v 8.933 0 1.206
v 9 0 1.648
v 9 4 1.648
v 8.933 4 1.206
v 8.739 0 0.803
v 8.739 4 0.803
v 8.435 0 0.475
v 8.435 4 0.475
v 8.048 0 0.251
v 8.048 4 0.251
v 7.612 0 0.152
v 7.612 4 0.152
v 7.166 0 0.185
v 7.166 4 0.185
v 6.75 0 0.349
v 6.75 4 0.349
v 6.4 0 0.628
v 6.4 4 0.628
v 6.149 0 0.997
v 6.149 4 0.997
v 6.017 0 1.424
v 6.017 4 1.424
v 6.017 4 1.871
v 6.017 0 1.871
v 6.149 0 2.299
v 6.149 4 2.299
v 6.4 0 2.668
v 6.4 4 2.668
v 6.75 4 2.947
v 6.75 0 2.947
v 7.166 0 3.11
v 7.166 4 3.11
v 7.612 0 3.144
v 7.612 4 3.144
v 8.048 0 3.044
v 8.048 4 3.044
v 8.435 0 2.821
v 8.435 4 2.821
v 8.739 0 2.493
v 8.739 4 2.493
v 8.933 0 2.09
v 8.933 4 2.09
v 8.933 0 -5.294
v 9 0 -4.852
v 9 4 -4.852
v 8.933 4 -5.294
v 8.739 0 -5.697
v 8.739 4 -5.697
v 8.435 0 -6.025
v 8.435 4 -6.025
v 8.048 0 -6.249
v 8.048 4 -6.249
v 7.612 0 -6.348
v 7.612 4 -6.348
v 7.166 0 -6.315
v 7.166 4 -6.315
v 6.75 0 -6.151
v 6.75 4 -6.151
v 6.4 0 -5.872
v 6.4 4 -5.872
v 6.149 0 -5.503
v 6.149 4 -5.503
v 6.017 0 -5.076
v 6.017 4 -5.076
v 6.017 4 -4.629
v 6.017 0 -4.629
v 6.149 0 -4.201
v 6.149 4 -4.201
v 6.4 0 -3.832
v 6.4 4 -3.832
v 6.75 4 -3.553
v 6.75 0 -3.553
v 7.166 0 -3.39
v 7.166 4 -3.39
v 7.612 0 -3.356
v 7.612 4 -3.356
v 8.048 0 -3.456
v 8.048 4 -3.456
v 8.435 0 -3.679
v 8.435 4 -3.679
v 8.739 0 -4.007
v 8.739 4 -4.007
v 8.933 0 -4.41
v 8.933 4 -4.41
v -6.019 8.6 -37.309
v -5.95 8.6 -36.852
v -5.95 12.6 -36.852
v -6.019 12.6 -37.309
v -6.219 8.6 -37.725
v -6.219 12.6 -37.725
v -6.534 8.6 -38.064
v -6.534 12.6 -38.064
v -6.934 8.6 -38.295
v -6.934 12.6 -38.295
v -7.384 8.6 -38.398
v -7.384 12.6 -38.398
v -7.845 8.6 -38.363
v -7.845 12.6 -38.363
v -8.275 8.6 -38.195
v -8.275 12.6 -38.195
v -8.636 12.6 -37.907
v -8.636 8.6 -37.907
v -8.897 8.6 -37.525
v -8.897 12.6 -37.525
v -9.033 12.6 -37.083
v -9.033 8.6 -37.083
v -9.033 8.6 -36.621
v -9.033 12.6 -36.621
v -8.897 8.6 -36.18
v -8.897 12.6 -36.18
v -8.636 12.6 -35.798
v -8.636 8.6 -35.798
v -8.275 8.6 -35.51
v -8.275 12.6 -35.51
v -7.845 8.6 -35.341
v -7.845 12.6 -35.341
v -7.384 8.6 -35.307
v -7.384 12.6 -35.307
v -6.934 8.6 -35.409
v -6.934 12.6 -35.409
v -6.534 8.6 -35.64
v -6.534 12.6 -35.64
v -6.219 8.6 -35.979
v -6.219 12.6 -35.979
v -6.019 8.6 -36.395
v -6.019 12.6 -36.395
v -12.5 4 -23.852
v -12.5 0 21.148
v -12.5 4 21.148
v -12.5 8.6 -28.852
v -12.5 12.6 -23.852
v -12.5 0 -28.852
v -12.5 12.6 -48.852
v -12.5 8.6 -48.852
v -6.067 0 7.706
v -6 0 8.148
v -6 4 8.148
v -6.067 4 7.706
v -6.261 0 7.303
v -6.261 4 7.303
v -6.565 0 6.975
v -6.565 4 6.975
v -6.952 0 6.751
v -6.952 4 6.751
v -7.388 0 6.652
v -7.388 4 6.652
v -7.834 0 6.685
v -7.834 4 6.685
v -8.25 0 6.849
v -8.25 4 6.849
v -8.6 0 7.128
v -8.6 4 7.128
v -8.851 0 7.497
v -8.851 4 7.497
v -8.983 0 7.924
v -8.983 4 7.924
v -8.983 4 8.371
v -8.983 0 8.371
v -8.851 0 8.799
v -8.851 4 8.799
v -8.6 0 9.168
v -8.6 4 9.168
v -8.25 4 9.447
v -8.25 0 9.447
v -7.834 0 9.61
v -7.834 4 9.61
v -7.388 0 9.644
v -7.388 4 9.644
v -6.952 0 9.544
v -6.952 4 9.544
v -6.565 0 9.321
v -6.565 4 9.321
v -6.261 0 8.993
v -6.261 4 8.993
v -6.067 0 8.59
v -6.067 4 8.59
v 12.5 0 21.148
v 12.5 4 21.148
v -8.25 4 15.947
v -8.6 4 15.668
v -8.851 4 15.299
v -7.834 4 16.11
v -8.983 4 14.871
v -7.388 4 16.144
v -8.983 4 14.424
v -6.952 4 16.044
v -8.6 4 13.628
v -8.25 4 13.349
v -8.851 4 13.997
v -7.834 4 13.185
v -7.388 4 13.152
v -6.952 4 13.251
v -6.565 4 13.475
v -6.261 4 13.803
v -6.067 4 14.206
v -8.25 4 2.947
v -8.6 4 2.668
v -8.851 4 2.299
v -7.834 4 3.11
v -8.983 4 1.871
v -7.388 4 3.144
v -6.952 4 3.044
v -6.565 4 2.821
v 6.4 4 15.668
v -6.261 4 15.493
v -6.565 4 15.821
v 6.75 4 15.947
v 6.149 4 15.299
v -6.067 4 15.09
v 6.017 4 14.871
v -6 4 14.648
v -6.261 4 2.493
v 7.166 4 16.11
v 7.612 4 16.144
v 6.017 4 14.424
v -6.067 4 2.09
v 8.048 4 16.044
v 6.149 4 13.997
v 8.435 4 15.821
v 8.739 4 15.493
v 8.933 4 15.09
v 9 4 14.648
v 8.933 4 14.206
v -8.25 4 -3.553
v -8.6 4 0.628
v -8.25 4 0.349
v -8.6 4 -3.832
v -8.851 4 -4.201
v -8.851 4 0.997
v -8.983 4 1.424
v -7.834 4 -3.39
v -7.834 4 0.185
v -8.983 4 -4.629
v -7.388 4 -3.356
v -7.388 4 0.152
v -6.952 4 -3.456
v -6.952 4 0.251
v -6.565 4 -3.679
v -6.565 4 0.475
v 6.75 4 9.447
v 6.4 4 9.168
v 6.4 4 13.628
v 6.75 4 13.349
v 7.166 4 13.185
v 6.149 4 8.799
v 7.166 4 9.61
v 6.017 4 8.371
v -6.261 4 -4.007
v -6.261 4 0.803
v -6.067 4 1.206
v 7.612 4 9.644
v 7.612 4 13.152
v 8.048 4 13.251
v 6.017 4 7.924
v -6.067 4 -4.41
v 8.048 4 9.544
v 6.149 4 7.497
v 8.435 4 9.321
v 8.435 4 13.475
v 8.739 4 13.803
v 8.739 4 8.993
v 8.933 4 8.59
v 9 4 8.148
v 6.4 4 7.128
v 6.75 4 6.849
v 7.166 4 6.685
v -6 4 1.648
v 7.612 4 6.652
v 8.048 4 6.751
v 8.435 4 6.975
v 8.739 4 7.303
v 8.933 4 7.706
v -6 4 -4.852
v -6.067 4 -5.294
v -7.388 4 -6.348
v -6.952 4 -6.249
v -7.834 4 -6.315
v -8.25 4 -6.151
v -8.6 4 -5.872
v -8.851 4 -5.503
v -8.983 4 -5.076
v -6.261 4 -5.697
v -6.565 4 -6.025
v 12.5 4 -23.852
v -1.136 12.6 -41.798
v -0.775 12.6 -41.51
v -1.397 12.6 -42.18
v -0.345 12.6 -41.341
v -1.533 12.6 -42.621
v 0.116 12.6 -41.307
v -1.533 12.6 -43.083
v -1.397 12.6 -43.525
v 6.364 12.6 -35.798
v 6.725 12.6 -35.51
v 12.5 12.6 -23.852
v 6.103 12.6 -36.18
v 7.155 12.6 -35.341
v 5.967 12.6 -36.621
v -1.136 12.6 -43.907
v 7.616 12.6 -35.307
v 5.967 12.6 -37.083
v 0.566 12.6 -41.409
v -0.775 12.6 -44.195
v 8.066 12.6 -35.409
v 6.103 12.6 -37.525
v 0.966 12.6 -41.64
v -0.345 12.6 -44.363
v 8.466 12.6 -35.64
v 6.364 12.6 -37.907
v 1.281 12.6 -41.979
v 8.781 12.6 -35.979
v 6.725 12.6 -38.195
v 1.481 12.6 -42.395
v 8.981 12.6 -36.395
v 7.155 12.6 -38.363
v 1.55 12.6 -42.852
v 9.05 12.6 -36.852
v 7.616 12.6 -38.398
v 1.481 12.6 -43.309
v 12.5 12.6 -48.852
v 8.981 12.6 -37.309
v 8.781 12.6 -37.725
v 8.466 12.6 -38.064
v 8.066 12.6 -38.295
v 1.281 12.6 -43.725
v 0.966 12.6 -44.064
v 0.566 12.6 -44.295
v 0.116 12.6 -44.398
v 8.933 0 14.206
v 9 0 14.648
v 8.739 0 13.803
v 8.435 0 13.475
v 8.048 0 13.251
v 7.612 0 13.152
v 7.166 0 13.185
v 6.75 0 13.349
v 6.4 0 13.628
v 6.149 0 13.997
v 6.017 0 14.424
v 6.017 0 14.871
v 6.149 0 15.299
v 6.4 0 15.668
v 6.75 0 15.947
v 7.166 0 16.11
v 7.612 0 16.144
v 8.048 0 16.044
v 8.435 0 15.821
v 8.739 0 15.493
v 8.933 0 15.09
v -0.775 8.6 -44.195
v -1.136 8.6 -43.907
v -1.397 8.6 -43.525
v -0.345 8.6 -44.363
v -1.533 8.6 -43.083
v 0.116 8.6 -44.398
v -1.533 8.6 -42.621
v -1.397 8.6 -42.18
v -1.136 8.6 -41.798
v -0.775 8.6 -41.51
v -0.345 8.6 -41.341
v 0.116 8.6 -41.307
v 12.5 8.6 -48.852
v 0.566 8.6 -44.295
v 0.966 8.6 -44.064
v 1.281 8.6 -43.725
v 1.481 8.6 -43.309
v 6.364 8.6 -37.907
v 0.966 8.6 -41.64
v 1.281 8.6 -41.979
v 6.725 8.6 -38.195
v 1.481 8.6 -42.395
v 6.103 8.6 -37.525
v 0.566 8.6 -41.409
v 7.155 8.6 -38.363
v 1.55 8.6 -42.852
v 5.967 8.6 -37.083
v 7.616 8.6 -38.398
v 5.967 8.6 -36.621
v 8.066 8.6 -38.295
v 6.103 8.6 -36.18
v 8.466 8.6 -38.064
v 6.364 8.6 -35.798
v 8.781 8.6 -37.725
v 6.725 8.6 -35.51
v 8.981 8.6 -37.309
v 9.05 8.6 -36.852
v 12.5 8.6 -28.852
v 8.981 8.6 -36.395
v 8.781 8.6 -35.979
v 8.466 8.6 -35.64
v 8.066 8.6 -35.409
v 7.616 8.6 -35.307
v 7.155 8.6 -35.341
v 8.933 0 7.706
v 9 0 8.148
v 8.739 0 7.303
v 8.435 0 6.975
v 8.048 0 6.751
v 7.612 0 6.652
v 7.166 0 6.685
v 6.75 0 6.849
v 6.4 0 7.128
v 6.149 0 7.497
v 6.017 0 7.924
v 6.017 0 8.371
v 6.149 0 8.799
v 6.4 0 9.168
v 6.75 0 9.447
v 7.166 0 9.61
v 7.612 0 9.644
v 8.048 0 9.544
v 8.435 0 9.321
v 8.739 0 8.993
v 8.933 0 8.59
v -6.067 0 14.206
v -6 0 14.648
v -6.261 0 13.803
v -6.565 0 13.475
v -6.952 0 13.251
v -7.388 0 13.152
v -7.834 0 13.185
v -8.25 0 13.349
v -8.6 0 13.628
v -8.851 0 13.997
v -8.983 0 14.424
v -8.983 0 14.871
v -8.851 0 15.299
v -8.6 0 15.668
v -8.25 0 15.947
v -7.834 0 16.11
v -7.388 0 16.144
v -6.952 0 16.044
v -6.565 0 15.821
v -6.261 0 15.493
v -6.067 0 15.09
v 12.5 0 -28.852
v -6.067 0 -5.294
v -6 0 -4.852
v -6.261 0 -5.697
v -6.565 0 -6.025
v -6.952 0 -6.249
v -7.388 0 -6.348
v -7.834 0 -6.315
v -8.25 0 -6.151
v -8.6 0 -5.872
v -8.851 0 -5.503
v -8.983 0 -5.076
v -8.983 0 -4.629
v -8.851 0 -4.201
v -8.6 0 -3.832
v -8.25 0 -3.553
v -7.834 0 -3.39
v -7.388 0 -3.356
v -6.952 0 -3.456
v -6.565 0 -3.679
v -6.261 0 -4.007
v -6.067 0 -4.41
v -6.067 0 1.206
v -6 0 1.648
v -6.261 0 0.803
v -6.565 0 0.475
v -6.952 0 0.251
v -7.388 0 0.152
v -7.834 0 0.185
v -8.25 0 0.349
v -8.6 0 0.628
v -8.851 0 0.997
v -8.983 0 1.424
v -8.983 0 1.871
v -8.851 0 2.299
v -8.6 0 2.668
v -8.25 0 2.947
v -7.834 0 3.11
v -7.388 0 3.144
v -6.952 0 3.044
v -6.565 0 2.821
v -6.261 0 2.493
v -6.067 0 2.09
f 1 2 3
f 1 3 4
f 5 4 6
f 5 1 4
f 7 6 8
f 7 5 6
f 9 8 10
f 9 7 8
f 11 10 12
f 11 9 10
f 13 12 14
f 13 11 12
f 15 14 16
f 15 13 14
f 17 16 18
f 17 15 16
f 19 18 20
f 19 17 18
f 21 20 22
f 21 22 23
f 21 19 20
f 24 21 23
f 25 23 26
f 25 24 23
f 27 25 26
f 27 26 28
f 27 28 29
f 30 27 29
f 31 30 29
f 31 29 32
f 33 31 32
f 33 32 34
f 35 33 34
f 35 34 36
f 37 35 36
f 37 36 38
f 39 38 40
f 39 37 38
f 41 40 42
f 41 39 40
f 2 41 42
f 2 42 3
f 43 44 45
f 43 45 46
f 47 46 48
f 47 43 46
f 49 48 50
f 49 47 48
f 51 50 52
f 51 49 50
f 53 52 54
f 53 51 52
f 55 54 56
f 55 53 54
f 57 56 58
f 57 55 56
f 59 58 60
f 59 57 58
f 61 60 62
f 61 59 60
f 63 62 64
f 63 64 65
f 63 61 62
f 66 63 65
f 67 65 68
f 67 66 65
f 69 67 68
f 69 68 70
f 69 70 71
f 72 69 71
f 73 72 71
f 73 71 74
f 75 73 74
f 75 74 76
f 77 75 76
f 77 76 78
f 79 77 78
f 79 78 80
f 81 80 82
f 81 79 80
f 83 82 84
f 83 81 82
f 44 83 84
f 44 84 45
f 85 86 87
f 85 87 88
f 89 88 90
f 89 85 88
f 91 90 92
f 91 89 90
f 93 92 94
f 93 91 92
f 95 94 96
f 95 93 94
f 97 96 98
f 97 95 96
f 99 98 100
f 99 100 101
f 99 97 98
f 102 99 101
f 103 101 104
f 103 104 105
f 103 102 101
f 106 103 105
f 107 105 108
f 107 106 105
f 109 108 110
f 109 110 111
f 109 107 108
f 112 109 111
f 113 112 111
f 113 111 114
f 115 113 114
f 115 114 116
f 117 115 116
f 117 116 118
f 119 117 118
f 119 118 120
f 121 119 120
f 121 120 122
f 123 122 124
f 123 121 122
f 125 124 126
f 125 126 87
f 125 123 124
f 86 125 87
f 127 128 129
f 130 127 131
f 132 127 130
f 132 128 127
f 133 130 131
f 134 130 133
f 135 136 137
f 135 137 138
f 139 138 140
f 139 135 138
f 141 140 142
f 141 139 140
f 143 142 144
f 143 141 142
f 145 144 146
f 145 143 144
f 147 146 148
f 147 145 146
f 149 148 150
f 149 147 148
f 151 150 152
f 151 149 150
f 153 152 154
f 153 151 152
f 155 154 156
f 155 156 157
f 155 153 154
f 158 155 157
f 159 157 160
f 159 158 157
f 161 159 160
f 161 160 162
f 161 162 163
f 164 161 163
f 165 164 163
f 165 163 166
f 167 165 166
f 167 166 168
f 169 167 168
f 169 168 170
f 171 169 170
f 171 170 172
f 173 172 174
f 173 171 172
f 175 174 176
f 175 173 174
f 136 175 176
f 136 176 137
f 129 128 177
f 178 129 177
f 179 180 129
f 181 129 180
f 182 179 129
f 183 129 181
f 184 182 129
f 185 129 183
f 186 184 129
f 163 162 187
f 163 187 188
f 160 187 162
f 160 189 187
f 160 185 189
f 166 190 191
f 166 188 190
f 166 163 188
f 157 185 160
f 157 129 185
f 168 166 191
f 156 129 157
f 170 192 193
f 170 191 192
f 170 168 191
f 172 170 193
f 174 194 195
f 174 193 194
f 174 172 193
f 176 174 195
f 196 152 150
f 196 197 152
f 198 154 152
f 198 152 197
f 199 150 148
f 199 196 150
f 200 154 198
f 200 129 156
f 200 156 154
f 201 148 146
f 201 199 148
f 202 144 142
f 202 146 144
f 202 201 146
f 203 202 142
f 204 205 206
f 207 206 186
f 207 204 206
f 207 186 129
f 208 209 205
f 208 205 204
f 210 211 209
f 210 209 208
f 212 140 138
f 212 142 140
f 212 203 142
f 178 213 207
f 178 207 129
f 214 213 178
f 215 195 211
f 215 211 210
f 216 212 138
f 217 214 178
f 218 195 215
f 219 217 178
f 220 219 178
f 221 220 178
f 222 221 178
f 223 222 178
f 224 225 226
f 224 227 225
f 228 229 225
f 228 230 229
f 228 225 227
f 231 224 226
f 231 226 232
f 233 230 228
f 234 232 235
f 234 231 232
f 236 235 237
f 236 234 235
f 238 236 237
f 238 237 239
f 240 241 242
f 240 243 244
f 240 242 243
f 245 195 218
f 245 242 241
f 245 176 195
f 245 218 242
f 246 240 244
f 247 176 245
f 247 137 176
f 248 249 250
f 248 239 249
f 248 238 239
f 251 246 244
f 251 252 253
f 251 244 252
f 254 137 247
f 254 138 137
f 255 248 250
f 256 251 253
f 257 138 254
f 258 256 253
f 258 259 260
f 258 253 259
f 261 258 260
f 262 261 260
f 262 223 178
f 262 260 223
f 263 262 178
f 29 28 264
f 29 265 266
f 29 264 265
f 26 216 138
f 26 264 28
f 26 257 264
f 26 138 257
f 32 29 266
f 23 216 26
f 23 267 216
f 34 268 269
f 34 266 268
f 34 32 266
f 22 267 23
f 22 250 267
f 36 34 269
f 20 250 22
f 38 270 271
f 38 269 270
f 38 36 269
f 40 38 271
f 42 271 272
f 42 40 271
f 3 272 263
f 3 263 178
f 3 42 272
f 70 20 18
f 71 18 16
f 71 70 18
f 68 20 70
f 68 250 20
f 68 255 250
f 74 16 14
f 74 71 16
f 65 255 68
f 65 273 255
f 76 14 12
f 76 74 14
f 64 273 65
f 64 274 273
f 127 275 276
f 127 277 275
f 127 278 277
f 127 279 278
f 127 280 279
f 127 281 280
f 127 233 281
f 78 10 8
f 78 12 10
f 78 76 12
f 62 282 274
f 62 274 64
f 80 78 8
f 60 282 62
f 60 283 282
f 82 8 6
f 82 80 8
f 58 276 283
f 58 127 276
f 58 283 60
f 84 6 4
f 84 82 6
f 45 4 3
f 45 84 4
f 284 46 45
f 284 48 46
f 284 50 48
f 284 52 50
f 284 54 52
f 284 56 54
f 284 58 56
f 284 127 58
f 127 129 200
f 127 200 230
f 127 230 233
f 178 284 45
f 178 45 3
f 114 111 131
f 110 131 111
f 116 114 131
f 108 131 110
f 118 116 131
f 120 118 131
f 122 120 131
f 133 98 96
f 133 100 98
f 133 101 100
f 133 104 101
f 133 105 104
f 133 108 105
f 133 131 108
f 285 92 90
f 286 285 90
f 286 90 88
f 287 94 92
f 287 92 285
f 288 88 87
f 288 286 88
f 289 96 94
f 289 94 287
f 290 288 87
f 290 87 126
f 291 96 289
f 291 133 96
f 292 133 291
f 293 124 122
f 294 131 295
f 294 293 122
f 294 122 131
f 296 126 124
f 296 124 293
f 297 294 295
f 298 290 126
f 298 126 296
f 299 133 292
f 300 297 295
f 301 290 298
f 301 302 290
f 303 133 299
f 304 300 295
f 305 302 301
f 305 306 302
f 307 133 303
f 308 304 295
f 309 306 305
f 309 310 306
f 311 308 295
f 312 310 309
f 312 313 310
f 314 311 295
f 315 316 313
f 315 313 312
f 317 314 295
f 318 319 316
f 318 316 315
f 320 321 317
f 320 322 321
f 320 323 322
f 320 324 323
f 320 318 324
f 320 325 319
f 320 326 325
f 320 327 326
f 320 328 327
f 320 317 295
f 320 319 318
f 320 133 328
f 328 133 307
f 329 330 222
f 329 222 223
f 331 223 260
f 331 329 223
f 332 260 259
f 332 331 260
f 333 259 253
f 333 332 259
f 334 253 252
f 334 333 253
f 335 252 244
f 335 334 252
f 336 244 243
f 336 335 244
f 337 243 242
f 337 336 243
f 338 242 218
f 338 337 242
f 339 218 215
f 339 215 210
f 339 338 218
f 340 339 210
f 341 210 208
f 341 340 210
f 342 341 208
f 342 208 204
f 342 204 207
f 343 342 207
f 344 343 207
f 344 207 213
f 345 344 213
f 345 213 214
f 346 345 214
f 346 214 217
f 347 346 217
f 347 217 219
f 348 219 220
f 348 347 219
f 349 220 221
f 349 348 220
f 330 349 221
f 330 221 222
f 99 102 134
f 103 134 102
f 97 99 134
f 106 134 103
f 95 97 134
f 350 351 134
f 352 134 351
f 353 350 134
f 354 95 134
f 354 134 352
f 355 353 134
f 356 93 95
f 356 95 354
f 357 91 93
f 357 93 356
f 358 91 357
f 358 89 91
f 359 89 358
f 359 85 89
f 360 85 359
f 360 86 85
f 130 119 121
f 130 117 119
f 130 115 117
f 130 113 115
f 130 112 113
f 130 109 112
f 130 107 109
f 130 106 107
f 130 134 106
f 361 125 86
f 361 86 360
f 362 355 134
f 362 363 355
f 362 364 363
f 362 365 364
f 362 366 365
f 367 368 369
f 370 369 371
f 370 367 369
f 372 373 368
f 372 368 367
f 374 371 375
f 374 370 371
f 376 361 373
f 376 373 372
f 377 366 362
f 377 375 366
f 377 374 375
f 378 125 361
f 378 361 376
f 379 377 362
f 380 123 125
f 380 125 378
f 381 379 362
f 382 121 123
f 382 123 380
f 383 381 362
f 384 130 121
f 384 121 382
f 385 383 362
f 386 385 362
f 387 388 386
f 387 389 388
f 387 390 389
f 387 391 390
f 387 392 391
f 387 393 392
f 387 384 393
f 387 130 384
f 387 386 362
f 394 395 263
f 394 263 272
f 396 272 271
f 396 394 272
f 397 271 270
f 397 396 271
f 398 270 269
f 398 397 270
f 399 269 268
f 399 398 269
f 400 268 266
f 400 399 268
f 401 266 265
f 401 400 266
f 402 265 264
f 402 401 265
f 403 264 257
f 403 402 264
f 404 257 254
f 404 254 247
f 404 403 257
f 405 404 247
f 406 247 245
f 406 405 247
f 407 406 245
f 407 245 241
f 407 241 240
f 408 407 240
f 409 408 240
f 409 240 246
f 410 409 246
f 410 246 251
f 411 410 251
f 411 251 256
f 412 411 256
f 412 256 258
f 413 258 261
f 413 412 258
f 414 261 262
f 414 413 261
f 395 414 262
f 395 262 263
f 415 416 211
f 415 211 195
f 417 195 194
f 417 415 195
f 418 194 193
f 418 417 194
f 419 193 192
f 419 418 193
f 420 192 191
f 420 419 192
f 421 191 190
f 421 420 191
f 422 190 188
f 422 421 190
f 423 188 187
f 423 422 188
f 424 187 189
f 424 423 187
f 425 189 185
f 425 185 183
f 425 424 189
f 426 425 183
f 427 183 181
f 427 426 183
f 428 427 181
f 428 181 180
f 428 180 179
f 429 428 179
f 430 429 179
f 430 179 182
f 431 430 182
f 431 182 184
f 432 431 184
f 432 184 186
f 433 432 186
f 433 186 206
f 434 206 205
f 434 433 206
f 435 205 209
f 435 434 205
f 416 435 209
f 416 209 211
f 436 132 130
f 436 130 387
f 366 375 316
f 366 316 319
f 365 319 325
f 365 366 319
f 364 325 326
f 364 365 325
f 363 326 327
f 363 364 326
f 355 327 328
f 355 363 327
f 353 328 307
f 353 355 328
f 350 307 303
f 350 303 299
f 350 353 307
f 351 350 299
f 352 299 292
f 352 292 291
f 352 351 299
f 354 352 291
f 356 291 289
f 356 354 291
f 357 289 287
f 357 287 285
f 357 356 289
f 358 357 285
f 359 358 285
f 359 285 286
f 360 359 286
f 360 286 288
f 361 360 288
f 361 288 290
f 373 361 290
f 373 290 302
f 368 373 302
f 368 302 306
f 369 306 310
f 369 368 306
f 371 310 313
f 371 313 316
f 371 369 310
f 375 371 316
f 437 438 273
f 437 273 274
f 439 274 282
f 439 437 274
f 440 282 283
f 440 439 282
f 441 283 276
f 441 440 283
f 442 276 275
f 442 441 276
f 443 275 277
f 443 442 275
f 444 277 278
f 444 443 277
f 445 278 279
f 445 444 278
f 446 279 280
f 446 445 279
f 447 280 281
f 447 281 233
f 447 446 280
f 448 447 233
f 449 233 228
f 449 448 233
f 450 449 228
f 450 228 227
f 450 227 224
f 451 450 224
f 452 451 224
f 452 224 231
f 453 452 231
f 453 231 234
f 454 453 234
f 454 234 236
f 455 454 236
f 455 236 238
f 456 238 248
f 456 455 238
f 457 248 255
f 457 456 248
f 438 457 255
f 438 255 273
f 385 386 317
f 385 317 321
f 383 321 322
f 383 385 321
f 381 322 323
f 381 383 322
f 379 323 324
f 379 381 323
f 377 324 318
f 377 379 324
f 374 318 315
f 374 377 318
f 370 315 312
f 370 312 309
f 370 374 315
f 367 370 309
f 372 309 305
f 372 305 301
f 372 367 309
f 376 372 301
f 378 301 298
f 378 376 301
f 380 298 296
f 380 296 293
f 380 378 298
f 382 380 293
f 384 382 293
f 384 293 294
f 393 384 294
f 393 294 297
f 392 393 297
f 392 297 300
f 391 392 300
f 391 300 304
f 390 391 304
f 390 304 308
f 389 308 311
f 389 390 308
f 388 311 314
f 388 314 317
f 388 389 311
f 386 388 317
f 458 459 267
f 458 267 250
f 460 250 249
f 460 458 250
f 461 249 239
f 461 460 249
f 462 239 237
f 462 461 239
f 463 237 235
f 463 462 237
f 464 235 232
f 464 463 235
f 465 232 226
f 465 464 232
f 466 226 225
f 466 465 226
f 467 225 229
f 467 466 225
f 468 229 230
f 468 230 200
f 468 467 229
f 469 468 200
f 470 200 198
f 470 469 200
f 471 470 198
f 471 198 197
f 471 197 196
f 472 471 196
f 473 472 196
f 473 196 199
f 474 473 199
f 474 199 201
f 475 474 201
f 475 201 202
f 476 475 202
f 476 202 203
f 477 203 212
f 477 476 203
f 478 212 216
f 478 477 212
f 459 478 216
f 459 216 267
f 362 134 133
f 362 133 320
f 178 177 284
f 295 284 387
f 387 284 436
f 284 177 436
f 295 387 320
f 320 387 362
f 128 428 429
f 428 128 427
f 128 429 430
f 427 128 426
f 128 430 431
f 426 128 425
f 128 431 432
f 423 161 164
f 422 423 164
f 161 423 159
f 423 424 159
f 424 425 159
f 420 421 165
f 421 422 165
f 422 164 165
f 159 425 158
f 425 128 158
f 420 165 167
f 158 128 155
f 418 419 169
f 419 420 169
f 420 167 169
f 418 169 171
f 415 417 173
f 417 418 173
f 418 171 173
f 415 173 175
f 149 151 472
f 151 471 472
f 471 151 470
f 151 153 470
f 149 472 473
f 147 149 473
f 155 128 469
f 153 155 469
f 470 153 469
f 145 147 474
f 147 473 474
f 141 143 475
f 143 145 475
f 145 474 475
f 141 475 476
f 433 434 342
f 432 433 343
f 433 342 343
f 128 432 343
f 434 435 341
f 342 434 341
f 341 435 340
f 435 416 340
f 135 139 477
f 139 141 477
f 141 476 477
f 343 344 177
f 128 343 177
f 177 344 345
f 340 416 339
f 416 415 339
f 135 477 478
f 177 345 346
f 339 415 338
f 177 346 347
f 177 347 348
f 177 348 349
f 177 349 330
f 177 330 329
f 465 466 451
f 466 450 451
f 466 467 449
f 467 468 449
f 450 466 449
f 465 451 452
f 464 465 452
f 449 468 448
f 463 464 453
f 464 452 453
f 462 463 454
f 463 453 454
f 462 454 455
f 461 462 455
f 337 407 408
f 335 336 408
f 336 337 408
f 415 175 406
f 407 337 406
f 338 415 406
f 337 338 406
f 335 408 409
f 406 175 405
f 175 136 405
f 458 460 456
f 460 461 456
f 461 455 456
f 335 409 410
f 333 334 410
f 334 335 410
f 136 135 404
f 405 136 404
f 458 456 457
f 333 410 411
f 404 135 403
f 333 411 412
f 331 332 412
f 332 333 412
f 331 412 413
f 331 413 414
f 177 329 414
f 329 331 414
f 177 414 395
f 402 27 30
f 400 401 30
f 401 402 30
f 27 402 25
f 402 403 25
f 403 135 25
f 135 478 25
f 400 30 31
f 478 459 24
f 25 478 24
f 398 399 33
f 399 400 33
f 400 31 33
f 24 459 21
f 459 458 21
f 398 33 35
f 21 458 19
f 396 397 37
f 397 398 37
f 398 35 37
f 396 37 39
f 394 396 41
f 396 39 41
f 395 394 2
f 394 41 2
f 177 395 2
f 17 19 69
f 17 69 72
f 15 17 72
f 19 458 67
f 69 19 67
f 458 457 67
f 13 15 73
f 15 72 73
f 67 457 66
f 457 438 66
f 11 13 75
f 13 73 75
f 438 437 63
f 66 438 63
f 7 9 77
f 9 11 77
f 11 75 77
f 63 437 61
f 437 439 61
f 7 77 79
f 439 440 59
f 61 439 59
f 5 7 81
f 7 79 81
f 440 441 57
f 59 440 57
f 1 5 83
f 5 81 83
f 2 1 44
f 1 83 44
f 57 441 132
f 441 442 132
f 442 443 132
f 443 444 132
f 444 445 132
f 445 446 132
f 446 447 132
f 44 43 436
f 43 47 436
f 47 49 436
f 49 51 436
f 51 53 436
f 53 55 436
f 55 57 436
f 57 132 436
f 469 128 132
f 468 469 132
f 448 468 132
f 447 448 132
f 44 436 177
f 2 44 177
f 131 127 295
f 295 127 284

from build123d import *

# Parameters (mm, degrees)
SKETCH_1_W          = 25
SKETCH_1_H          = 70
SKETCH_1_R          = 1.55
SKETCH_1_R_2        = 1.5
EXTRUDE_1_DEPTH     = 4
SKETCH_2_W          = 25
SKETCH_2_H          = 25
SKETCH_2_R          = 1.55
EXTRUDE_2_DEPTH     = 8.6
SKETCH_3_W          = 25
SKETCH_3_H          = 20
SKETCH_3_R          = 1.55
CUT_EXTRUDE_1_DEPTH = 8.6


with BuildPart() as part:
    # Эскиз1 → Бобышка-Вытянуть1 (new body)
    with BuildSketch(Plane(origin=(0, 0, 0), x_dir=(1, 0, 0), z_dir=(0, 1, 0))):
        with Locations((0, 13.852233677)):
            Rectangle(SKETCH_1_W, SKETCH_1_H)
        with Locations((-7.5, 36.852233677)):
            Circle(SKETCH_1_R, mode=Mode.SUBTRACT)
        with Locations((7.5, 36.852233677)):
            Circle(SKETCH_1_R, mode=Mode.SUBTRACT)
        with Locations((-7.5, -14.647766323)):
            Circle(SKETCH_1_R_2, mode=Mode.SUBTRACT)
        with Locations((7.5, -14.647766323)):
            Circle(SKETCH_1_R_2, mode=Mode.SUBTRACT)
        with Locations((-7.5, -8.147766323)):
            Circle(SKETCH_1_R_2, mode=Mode.SUBTRACT)
        with Locations((7.5, -8.147766323)):
            Circle(SKETCH_1_R_2, mode=Mode.SUBTRACT)
        with Locations((-7.5, -1.647766323)):
            Circle(SKETCH_1_R_2, mode=Mode.SUBTRACT)
        with Locations((7.5, -1.647766323)):
            Circle(SKETCH_1_R_2, mode=Mode.SUBTRACT)
        with Locations((-7.5, 4.852233677)):
            Circle(SKETCH_1_R_2, mode=Mode.SUBTRACT)
        with Locations((7.5, 4.852233677)):
            Circle(SKETCH_1_R_2, mode=Mode.SUBTRACT)
        with Locations((0, 42.852233677)):
            Circle(SKETCH_1_R, mode=Mode.SUBTRACT)
    extrude(amount=EXTRUDE_1_DEPTH)

    # Эскиз2 → Бобышка-Вытянуть2 (add)
    with BuildSketch(Plane(origin=(0, 4, 0), x_dir=(1, 0, 0), z_dir=(0, 1, 0))):
        with Locations((0, 36.352233677)):
            Rectangle(SKETCH_2_W, SKETCH_2_H)
        with Locations((0, 42.852233677)):
            Circle(SKETCH_2_R, mode=Mode.SUBTRACT)
        with Locations((7.5, 36.852233677)):
            Circle(SKETCH_2_R, mode=Mode.SUBTRACT)
        with Locations((-7.5, 36.852233677)):
            Circle(SKETCH_2_R, mode=Mode.SUBTRACT)
    extrude(amount=EXTRUDE_2_DEPTH)

    # Эскиз3 → Вырез-Вытянуть1 (cut)
    with BuildSketch(Plane.XZ):
        with Locations((0, -38.852233677)):
            Rectangle(SKETCH_3_W, SKETCH_3_H)
        with Locations((-7.5, -36.852233677)):
            Circle(SKETCH_3_R, mode=Mode.SUBTRACT)
        with Locations((7.5, -36.852233677)):
            Circle(SKETCH_3_R, mode=Mode.SUBTRACT)
        with Locations((0, -42.852233677)):
            Circle(SKETCH_3_R, mode=Mode.SUBTRACT)
    extrude(amount=-CUT_EXTRUDE_1_DEPTH, mode=Mode.SUBTRACT)


solid = part.part
